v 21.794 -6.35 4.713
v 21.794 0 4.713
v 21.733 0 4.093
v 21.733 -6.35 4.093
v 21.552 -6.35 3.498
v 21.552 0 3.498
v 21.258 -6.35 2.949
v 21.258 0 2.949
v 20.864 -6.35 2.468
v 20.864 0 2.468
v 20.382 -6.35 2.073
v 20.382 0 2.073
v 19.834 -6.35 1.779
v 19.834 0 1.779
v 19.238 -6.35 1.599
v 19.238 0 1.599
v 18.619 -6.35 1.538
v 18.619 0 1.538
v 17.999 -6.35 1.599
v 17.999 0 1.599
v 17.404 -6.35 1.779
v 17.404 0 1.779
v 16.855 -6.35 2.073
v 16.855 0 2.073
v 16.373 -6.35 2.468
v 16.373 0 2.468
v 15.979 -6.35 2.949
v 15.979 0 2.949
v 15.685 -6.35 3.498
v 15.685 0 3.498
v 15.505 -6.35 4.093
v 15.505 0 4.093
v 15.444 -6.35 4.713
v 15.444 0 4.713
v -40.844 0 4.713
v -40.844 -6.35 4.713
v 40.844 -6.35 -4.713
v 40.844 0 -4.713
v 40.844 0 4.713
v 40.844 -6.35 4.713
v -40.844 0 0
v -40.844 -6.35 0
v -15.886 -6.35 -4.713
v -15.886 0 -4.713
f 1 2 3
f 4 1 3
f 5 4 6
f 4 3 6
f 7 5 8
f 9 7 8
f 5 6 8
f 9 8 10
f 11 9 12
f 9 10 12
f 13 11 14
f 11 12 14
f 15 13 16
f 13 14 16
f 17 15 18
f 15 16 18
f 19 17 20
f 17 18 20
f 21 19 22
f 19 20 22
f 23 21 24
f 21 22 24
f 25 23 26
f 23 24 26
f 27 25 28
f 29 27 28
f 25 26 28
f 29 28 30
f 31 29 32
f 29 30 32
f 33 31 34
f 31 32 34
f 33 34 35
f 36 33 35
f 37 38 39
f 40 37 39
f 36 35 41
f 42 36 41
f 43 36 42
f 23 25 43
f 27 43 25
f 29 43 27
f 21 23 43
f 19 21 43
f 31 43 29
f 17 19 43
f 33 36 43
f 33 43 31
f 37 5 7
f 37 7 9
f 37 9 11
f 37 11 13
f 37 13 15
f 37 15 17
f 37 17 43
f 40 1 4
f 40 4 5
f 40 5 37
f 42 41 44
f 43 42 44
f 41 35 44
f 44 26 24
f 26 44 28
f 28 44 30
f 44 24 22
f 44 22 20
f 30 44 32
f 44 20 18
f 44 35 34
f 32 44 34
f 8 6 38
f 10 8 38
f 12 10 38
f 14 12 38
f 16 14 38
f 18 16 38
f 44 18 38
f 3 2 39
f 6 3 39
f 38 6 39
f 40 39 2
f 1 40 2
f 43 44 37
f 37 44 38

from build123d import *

# Parameters (mm, degrees)
F1_DEPTH = 6.35


with BuildPart() as f1:
    # F0 (on Front) → F1 (new body)
    with BuildSketch(Plane.XZ):
        with BuildLine():
            Line((15.443564, 4.712719), (-40.843564, 4.712719))
            Line((-40.843564, 4.712719), (-40.843564, 0))
            Line((-40.843564, 0), (-15.885977, -4.712719))
            Line((-15.885977, -4.712719), (40.843564, -4.712719))
            Line((40.843564, -4.712719), (40.843564, 4.712719))
            Line((40.843564, 4.712719), (21.793564, 4.712719))
            ThreePointArc((21.793564, 4.712719), (18.618564, 1.537719), (15.443564, 4.712719))
        make_face()
    extrude(amount=F1_DEPTH)


solid = f1.part
